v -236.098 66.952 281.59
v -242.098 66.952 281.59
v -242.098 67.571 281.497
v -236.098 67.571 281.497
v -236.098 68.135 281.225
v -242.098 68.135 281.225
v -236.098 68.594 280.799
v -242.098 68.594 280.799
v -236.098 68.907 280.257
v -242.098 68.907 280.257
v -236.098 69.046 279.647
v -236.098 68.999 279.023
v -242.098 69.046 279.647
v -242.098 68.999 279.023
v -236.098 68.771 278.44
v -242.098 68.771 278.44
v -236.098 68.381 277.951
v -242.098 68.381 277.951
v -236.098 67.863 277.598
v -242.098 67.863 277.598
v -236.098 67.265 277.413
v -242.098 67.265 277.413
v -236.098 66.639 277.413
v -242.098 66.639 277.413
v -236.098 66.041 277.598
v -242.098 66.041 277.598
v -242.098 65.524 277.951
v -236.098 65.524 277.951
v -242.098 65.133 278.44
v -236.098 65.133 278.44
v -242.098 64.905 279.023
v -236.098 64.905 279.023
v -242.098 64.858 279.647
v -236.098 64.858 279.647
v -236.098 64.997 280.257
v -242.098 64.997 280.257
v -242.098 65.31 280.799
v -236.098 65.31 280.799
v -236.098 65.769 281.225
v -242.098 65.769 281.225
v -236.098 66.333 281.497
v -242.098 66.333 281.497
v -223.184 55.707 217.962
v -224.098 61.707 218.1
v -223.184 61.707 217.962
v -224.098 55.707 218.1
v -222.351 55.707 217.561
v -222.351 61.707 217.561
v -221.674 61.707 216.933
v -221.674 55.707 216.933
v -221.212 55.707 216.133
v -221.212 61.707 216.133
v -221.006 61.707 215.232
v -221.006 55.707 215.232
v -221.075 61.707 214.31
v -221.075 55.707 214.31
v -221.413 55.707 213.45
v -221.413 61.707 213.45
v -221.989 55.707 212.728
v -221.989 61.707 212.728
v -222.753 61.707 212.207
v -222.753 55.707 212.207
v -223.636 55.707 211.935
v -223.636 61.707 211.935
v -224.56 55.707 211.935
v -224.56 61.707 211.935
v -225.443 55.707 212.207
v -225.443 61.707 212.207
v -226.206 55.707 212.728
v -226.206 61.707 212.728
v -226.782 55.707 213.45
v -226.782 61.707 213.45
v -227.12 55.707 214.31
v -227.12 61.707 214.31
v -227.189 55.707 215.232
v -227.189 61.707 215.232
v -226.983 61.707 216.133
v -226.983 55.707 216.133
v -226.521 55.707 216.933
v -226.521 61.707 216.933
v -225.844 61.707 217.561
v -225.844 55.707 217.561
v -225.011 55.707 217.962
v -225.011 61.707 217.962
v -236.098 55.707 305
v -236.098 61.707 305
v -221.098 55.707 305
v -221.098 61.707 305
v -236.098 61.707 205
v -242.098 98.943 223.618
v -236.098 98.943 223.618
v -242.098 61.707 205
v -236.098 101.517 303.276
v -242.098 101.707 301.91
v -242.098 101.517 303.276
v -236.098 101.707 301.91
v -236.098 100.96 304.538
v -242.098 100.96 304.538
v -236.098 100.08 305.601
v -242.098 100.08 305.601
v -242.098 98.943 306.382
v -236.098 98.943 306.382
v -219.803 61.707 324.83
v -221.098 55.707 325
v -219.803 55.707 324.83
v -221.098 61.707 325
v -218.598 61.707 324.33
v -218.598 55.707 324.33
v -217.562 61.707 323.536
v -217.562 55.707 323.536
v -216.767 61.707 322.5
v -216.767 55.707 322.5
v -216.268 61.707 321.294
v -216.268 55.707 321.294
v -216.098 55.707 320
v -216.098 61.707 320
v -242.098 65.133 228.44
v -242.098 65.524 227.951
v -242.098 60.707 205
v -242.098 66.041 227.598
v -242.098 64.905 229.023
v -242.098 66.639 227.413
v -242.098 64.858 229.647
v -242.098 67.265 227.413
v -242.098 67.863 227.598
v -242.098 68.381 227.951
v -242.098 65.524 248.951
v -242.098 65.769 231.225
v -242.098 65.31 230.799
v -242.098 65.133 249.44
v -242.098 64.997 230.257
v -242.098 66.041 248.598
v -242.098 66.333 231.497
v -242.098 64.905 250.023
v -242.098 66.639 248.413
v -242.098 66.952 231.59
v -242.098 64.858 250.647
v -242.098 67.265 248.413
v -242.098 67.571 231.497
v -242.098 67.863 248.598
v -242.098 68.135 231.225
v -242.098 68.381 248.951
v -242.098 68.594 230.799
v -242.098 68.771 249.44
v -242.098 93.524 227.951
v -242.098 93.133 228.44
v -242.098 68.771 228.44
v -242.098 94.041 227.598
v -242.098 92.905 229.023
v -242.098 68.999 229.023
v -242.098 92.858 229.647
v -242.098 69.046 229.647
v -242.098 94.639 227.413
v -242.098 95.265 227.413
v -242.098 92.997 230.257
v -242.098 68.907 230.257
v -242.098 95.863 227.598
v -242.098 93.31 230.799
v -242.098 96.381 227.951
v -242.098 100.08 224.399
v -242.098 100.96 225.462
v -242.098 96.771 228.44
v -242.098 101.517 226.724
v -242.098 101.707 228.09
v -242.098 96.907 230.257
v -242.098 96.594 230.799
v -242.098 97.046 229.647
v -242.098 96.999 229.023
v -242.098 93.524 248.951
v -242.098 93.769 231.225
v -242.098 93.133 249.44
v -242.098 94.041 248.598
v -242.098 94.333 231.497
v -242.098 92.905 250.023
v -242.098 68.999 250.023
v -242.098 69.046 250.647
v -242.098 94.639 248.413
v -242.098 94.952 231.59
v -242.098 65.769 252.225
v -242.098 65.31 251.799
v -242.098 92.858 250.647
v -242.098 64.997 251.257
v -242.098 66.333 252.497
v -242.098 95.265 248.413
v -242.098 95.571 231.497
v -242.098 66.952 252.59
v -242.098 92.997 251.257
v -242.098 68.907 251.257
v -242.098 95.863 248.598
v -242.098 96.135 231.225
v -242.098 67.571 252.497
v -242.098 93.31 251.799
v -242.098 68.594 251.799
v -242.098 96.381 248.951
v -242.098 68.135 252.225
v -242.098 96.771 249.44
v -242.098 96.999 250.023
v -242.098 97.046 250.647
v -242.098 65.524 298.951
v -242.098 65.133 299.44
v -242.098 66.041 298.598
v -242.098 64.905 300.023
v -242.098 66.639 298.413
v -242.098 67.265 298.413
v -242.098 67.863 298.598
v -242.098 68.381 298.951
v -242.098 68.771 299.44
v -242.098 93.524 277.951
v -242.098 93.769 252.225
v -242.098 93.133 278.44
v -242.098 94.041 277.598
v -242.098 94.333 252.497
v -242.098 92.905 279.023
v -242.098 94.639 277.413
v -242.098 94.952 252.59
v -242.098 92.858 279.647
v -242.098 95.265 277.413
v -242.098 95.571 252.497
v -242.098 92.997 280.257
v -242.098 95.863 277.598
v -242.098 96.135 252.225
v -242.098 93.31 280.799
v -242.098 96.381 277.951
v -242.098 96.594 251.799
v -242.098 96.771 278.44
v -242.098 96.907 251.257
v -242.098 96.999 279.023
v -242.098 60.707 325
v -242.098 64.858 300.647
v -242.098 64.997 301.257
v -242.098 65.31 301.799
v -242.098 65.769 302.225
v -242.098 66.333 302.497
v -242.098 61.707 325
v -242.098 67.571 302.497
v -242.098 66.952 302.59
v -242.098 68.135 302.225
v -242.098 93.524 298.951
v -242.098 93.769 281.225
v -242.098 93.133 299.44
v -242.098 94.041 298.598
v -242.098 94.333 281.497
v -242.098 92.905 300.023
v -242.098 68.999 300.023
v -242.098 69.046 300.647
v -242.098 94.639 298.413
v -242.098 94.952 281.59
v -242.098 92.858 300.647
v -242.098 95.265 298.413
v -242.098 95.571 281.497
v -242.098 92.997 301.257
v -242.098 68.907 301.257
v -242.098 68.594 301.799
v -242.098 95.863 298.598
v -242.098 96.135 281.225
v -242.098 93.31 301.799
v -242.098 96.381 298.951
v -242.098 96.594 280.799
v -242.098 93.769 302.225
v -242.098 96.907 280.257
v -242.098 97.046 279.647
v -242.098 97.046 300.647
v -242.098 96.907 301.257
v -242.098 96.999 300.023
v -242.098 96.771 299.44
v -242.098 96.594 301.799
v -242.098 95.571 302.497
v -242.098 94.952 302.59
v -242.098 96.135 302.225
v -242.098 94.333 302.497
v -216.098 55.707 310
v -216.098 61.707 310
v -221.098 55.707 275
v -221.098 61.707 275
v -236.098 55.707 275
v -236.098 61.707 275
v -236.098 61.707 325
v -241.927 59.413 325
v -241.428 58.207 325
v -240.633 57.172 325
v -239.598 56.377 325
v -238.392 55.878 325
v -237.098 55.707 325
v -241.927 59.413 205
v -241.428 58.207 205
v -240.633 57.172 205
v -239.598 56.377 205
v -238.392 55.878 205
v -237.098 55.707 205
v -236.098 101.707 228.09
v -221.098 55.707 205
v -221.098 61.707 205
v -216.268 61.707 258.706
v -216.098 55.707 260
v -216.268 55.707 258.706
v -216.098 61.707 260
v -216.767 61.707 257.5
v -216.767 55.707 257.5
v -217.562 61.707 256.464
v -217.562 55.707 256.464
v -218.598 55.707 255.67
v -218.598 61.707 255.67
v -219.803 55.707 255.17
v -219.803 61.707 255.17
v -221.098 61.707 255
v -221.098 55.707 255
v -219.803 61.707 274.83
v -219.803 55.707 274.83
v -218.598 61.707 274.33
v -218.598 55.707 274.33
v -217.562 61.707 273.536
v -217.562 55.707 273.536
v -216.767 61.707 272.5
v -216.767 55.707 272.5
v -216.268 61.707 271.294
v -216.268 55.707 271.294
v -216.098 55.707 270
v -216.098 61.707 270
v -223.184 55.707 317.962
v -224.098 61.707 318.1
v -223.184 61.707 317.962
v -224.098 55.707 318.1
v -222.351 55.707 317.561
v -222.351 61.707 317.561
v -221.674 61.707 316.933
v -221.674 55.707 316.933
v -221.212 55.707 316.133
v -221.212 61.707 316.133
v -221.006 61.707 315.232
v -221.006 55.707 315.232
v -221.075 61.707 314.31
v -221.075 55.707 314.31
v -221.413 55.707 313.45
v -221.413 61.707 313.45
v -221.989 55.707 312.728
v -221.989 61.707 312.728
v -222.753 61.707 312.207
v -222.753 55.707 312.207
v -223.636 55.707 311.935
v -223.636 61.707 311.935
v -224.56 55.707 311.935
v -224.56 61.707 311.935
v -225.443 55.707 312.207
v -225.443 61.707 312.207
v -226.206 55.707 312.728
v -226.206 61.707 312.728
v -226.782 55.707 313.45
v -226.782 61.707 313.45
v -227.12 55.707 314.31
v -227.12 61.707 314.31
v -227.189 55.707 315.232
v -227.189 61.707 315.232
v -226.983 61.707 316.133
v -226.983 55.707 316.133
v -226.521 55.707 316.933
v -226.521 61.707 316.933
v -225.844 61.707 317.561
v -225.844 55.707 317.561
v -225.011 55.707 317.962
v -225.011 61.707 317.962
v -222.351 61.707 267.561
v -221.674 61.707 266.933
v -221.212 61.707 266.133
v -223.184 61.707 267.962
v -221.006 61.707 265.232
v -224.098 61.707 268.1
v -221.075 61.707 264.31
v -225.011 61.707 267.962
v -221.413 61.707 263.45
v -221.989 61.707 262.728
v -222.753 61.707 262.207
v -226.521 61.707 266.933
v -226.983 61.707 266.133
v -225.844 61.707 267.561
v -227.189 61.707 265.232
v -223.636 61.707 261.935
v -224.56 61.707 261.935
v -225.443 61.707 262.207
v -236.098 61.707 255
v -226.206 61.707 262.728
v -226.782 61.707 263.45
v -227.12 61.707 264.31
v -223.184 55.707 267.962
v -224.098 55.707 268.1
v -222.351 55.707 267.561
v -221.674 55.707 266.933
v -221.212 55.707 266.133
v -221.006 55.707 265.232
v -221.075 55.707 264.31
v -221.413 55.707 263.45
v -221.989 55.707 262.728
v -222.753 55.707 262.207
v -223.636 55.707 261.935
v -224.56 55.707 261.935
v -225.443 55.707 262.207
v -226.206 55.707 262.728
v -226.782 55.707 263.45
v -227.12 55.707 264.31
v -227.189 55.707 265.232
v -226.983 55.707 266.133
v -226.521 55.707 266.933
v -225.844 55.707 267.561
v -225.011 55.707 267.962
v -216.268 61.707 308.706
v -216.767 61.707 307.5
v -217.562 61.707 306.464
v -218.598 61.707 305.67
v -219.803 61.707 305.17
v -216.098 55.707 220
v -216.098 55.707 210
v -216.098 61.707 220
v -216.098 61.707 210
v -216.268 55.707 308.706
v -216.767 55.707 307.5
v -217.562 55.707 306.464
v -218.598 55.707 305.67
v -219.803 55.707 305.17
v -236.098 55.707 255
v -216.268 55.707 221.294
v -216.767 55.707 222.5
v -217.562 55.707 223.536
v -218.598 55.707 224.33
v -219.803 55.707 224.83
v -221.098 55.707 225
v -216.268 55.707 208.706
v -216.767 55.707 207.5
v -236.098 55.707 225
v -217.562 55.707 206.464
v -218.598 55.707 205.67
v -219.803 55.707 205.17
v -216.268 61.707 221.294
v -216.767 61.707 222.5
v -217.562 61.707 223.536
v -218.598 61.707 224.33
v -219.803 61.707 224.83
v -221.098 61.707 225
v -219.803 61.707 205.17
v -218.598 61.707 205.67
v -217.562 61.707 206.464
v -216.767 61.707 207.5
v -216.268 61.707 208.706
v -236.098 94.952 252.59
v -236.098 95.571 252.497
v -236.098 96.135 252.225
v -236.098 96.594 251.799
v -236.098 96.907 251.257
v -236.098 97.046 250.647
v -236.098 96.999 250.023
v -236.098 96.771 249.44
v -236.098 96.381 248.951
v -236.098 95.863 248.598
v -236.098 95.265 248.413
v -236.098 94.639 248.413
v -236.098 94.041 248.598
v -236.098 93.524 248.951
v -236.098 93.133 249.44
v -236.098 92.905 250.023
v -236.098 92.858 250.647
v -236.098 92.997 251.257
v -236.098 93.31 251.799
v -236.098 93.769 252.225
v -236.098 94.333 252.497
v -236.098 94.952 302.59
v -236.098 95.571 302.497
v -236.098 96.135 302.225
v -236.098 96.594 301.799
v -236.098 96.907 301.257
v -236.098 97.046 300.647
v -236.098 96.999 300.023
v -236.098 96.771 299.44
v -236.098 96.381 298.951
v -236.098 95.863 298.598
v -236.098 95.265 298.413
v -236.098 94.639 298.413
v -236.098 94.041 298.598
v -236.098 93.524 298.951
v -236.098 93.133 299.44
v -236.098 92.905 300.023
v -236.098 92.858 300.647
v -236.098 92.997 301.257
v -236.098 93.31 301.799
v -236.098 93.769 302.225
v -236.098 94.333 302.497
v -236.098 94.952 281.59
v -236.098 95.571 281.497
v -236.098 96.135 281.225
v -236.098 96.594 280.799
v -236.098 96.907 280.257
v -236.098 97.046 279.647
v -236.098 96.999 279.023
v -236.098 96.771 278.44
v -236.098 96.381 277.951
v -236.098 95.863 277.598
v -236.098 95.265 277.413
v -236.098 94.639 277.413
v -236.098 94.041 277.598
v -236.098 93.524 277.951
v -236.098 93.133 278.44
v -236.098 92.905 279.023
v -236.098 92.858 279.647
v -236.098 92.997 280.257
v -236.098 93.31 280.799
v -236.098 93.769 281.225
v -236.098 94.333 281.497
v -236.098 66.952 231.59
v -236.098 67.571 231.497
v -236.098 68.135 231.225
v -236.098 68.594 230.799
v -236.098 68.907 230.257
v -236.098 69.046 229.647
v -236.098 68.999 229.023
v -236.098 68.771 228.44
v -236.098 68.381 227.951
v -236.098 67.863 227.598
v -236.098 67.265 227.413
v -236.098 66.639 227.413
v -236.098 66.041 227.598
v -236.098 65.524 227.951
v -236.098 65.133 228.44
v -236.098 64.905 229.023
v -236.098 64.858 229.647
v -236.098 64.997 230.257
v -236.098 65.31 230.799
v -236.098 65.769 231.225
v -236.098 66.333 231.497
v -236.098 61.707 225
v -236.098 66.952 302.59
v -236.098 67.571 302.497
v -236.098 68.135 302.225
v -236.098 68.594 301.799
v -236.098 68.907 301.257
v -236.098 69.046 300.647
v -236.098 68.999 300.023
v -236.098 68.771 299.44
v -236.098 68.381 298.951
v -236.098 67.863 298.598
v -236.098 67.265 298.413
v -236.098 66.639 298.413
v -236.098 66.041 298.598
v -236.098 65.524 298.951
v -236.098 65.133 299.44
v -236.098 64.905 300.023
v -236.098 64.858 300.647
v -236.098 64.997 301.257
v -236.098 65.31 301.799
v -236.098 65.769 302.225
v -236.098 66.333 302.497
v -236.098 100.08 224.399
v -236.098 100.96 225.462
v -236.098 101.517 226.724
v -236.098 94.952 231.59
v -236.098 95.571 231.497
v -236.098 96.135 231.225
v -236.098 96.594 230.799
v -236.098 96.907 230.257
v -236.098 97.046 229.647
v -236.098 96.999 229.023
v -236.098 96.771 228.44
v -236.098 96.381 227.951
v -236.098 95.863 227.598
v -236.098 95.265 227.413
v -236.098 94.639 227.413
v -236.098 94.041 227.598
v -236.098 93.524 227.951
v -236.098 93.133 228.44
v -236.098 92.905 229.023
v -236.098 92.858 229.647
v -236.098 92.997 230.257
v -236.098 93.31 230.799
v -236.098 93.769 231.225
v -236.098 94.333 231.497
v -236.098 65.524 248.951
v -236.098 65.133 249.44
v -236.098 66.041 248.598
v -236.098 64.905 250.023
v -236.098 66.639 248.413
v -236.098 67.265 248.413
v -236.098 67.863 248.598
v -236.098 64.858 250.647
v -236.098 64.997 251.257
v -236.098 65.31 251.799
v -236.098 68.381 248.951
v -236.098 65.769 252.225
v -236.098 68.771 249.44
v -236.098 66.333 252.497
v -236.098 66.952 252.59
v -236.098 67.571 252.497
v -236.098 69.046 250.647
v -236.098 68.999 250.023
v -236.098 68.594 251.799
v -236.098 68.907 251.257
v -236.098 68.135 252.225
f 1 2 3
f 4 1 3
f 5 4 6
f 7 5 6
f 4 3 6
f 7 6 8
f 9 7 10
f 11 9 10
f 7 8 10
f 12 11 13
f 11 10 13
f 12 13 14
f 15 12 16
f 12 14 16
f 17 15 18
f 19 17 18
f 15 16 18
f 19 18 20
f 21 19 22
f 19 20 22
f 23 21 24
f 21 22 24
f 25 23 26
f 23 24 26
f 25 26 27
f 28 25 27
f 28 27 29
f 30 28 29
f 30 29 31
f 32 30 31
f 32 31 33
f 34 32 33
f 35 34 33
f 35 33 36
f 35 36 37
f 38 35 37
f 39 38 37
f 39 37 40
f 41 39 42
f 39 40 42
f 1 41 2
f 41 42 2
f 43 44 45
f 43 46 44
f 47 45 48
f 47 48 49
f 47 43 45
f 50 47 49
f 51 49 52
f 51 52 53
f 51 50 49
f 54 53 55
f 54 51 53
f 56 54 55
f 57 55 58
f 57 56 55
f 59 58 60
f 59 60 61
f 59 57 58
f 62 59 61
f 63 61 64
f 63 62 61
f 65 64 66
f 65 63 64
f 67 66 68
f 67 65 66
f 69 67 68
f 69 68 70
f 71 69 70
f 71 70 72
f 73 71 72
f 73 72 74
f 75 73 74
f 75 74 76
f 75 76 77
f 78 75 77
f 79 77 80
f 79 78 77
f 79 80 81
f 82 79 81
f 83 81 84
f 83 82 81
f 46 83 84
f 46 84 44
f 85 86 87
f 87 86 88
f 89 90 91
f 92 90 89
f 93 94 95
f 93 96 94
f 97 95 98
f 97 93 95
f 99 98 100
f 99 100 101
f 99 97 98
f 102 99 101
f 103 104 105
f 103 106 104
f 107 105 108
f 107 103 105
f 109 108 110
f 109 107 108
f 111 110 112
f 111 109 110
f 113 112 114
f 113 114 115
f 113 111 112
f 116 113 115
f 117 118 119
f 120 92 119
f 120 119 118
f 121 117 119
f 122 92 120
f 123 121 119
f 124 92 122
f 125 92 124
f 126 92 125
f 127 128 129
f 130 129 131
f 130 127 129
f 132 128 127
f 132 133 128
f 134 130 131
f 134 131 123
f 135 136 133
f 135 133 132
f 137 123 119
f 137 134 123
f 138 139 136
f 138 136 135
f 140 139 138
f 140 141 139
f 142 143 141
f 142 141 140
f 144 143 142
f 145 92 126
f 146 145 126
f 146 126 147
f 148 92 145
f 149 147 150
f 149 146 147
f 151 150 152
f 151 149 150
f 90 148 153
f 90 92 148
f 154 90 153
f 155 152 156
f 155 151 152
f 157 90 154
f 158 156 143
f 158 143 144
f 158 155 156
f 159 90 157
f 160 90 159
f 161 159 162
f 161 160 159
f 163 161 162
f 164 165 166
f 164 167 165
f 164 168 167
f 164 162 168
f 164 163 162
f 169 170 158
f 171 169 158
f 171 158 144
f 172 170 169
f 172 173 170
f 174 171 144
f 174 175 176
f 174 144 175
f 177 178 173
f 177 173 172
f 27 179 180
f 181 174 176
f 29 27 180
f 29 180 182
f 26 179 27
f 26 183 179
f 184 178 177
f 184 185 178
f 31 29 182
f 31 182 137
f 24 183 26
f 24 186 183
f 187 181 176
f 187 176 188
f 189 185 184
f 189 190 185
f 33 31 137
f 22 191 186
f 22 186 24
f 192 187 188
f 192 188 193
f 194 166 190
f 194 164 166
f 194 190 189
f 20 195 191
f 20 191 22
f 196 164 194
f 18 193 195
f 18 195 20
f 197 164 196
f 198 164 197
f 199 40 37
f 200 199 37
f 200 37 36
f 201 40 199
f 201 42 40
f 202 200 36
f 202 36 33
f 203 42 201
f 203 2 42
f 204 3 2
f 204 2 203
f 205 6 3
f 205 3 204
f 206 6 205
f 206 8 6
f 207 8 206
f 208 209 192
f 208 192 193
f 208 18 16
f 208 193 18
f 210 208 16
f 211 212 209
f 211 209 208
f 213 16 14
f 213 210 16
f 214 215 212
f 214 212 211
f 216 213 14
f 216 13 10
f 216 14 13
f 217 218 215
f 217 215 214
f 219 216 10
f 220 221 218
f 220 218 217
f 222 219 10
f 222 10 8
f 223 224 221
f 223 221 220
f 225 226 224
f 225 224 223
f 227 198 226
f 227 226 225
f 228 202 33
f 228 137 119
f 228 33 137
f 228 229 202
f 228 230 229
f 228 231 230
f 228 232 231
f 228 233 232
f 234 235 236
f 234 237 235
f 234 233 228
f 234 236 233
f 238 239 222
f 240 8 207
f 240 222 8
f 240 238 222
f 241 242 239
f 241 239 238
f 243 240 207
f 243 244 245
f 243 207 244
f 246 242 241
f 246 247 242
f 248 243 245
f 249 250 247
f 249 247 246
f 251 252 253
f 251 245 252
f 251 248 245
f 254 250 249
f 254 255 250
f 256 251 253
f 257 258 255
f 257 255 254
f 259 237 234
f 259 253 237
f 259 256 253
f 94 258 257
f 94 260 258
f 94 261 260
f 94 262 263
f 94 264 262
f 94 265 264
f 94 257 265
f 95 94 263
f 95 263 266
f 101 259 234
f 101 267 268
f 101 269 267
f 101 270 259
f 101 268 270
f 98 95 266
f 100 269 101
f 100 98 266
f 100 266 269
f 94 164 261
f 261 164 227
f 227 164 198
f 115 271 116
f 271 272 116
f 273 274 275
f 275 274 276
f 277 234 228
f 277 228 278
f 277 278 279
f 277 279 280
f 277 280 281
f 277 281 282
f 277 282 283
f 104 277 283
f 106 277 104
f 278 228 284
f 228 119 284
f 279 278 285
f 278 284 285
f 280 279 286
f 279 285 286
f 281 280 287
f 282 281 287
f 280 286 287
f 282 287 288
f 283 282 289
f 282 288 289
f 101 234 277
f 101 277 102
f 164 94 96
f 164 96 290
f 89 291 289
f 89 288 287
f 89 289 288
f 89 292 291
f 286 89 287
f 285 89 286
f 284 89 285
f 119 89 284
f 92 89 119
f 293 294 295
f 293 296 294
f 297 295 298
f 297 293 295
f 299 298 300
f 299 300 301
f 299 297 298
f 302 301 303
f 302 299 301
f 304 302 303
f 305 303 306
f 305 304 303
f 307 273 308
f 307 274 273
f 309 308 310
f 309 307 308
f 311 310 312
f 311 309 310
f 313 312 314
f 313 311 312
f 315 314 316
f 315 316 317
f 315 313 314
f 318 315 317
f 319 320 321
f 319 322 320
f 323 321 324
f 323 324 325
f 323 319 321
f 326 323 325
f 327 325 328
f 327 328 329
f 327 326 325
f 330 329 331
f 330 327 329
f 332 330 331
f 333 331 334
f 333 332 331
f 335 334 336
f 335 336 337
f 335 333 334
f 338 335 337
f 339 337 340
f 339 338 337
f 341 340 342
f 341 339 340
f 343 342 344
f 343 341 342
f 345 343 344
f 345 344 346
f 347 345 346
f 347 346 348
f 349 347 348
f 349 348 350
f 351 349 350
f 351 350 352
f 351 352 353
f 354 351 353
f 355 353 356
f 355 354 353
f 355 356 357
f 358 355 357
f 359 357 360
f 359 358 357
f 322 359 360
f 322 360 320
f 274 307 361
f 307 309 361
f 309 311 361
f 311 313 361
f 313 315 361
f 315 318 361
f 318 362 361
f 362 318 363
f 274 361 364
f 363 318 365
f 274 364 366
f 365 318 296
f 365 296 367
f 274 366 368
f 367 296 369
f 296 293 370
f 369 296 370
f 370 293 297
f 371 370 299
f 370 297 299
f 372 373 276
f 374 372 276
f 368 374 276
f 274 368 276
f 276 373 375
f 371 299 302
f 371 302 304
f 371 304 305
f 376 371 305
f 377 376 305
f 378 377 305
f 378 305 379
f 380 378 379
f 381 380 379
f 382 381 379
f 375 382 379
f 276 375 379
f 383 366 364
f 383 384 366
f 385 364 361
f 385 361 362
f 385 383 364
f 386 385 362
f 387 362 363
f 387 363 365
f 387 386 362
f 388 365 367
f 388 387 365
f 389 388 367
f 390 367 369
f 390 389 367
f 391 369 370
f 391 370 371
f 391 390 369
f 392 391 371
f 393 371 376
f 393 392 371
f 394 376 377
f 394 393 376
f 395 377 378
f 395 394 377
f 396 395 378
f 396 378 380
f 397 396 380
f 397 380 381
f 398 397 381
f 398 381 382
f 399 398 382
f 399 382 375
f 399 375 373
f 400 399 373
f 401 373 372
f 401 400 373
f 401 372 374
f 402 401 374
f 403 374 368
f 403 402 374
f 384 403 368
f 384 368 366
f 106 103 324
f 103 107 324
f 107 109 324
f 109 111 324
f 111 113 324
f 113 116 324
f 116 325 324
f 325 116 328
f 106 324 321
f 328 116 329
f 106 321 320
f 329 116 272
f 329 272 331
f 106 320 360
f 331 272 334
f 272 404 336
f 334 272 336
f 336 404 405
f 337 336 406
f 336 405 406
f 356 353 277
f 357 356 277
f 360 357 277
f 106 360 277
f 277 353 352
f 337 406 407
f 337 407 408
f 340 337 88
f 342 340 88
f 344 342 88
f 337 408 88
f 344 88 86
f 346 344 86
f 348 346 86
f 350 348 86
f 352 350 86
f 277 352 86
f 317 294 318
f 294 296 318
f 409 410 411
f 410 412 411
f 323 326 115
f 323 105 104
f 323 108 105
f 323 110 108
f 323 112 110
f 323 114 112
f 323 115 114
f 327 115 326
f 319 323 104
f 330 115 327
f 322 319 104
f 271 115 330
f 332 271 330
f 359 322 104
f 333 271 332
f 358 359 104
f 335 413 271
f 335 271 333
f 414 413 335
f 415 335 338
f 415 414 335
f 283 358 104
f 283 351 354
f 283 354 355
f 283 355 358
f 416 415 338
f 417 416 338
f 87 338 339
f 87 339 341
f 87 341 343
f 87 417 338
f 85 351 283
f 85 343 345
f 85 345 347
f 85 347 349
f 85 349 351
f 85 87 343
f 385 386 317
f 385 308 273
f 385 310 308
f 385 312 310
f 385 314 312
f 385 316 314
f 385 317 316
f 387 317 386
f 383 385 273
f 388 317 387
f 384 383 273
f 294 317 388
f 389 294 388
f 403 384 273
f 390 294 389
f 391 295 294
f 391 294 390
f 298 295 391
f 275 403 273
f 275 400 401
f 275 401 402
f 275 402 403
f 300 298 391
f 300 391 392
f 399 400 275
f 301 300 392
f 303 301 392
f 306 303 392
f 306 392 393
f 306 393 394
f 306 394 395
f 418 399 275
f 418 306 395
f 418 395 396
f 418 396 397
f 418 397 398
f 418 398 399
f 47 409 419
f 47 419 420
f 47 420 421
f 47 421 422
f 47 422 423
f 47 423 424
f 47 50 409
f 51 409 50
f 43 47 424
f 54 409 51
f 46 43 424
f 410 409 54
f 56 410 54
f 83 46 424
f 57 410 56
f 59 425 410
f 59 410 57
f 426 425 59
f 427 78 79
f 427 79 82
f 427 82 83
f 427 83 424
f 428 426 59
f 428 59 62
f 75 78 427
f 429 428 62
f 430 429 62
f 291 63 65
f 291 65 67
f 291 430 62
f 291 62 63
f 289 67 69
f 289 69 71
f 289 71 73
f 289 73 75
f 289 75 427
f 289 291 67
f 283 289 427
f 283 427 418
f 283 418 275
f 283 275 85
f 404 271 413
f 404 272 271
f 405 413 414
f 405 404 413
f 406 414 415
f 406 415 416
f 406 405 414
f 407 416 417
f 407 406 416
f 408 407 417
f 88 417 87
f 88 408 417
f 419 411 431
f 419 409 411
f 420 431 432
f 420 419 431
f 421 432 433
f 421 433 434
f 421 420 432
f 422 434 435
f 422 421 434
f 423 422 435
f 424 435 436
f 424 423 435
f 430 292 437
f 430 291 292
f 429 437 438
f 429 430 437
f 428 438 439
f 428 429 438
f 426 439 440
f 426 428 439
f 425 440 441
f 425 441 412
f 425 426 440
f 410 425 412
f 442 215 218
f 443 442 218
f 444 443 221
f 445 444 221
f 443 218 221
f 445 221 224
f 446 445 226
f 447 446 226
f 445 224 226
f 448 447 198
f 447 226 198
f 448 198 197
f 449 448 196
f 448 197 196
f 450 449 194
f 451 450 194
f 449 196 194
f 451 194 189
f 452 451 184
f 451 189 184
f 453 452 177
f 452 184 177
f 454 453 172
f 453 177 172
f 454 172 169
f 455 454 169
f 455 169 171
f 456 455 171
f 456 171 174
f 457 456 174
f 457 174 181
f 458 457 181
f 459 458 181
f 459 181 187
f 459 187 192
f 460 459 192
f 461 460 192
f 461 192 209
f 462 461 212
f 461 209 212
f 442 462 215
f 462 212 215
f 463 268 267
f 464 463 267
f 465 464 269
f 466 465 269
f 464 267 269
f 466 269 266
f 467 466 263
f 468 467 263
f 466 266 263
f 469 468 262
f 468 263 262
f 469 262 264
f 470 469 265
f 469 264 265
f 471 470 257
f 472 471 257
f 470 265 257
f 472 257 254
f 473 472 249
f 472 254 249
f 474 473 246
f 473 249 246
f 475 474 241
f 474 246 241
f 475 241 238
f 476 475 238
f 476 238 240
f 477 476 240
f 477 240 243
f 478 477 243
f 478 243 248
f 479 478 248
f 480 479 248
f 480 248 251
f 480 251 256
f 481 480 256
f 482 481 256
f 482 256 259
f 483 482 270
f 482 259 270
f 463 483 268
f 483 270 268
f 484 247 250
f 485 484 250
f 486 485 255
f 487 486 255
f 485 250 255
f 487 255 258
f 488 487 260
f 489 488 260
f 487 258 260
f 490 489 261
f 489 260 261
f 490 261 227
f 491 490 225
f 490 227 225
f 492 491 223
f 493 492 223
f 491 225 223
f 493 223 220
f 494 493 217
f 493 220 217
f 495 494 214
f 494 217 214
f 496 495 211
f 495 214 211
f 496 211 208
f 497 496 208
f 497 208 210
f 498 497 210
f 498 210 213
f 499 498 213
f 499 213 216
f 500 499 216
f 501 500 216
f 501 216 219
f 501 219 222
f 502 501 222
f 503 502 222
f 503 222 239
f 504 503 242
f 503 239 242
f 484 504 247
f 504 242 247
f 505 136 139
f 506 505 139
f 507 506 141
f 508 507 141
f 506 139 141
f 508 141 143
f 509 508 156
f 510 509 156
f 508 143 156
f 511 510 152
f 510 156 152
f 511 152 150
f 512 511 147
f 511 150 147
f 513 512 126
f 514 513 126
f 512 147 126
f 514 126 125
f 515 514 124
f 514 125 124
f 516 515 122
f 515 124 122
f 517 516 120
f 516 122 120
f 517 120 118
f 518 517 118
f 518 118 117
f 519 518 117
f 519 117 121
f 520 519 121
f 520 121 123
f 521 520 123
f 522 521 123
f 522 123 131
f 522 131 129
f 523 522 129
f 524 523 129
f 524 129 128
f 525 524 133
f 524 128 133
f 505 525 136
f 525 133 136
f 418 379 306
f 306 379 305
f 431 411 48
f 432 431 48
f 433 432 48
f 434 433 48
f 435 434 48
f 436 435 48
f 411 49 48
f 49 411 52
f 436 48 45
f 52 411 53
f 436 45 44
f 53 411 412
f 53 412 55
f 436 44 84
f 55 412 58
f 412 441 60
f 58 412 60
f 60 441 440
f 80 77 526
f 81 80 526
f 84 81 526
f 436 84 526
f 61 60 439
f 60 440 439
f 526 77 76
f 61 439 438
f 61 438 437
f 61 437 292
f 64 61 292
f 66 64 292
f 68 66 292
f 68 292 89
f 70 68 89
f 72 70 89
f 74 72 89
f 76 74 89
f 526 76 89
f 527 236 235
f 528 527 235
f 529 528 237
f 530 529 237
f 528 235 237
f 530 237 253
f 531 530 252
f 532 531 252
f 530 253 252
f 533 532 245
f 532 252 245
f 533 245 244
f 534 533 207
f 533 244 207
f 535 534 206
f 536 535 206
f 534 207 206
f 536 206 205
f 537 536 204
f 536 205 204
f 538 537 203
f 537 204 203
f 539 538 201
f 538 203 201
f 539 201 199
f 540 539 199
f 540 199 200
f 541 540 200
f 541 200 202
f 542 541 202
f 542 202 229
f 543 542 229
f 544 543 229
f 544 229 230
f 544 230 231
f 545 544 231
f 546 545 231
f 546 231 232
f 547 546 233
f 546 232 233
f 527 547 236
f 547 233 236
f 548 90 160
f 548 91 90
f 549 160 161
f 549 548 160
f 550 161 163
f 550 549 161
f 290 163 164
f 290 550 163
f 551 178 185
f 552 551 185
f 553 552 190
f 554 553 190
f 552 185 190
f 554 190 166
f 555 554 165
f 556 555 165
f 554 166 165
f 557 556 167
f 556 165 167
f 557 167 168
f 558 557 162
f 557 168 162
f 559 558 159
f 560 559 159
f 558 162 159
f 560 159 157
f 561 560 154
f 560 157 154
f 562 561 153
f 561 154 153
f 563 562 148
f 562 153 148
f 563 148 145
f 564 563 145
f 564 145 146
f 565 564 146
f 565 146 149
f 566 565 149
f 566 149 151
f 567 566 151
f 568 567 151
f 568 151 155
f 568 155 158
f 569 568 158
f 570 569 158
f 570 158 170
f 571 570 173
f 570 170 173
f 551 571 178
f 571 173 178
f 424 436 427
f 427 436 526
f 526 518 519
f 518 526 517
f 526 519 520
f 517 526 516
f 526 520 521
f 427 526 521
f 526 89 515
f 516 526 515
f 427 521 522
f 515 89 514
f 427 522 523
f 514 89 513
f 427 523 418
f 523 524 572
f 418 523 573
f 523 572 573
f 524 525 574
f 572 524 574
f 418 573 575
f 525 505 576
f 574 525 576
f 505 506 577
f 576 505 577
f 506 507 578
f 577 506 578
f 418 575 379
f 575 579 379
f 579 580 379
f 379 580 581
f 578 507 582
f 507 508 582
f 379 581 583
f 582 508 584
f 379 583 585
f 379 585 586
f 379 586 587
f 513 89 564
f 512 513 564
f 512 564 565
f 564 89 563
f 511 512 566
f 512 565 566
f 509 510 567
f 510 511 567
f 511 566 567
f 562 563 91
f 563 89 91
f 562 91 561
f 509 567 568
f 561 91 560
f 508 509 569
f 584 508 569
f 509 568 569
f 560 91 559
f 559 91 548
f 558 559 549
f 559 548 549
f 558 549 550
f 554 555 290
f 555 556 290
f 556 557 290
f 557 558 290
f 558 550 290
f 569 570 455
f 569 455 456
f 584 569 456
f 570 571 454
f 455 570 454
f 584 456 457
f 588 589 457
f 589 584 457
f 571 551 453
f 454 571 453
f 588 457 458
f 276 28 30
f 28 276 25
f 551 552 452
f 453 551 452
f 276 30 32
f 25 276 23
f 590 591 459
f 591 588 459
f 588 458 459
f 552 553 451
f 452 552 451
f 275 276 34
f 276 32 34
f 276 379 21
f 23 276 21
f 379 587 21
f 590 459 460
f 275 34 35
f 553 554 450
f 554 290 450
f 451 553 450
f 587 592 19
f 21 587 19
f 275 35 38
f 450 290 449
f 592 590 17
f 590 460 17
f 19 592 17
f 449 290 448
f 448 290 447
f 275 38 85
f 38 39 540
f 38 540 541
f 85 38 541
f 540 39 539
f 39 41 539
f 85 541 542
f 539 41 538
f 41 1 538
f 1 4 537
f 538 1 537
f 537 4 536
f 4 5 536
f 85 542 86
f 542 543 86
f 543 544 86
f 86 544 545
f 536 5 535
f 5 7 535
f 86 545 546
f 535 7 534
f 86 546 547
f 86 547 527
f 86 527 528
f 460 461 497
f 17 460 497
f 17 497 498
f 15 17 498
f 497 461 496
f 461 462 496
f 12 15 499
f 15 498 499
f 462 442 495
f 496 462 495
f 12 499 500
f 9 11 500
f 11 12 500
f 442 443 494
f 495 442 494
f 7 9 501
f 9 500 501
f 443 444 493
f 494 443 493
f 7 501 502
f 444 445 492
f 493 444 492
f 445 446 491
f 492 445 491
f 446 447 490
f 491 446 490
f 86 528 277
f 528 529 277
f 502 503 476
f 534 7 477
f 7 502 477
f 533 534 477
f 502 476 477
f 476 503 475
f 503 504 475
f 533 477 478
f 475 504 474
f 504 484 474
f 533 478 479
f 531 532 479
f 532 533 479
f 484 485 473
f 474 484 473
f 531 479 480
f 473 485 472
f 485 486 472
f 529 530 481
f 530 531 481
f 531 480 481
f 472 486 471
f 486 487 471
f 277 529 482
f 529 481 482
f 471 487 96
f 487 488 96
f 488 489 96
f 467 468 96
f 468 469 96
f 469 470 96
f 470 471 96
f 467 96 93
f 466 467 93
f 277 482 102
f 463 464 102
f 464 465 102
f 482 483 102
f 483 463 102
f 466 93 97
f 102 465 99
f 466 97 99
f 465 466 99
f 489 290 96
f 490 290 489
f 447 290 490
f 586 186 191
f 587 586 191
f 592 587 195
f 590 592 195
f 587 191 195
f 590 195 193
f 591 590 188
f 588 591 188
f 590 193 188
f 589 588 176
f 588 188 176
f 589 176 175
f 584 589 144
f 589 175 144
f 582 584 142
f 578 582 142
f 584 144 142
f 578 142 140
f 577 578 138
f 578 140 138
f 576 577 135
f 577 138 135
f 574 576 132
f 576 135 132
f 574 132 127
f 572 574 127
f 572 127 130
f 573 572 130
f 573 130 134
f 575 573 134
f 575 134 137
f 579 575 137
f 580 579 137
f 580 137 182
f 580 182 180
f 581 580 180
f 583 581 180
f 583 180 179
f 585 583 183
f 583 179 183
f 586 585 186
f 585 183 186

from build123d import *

# Parameters (mm, degrees)
CROQUIS2_R              = 3.1
SALIENTE_EXTRUIR1_DEPTH = 3
CROQUIS4_R              = 2.1
SALIENTE_EXTRUIR2_DEPTH = 6
REDONDEO1_R             = 5


with BuildPart() as part:
    # Croquis2 → Saliente-Extruir1 (new, symmetric)
    with BuildSketch(Plane(origin=(0, 58.707138557, 0), x_dir=(1, 0, 0), z_dir=(0, 1, 0))):
        Polygon((-236.097571291, -325), (-242.097571291, -325), (-242.097571291, -205), (-236.097571291, -205), (-216.097571291, -205), (-216.097571291, -225), (-236.097571291, -225), (-236.097571291, -255), (-216.097571291, -255), (-216.097571291, -275), (-236.097571291, -275), (-236.097571291, -305), (-216.097571291, -305), (-216.097571291, -325), align=None)
        with Locations(Location((-224.097571291, -215, 0), (0, 0, 270))):
            Circle(CROQUIS2_R, mode=Mode.SUBTRACT)
        with Locations(Location((-224.097571291, -265, 0), (0, 0, 270))):
            Circle(CROQUIS2_R, mode=Mode.SUBTRACT)
        with Locations(Location((-224.097571291, -315, 0), (0, 0, 270))):
            Circle(CROQUIS2_R, mode=Mode.SUBTRACT)
    extrude(amount=SALIENTE_EXTRUIR1_DEPTH, both=True)

    # Croquis4 → Saliente-Extruir2 (add)
    with BuildSketch(Plane.ZY.offset(242.097571291)):
        Polygon((205, 61.707138557), (325, 61.707138557), (305, 101.707138557), (225, 101.707138557), align=None)
        with Locations((250.49, 66.952138557)):
            Circle(CROQUIS4_R, mode=Mode.SUBTRACT)
        with Locations((229.49, 66.952138557)):
            Circle(CROQUIS4_R, mode=Mode.SUBTRACT)
        with Locations((279.49, 66.952138557)):
            Circle(CROQUIS4_R, mode=Mode.SUBTRACT)
        with Locations((300.49, 66.952138557)):
            Circle(CROQUIS4_R, mode=Mode.SUBTRACT)
        with Locations((279.49, 94.952138557)):
            Circle(CROQUIS4_R, mode=Mode.SUBTRACT)
        with Locations((300.49, 94.952138557)):
            Circle(CROQUIS4_R, mode=Mode.SUBTRACT)
        with Locations((229.49, 94.952138557)):
            Circle(CROQUIS4_R, mode=Mode.SUBTRACT)
        with Locations((250.49, 94.952138557)):
            Circle(CROQUIS4_R, mode=Mode.SUBTRACT)
    extrude(amount=-SALIENTE_EXTRUIR2_DEPTH)

    # Redondeo1
    redondeo1_edges = [part.edges().sort_by_distance(p)[0] for p in [
        (-242.097571291, 55.707138557, 265),
        (-216.097571291, 58.707138557, 205),
        (-216.097571291, 58.707138557, 225),
        (-216.097571291, 58.707138557, 255),
        (-216.097571291, 58.707138557, 275),
        (-216.097571291, 58.707138557, 305),
        (-216.097571291, 58.707138557, 325),
        (-239.097571291, 101.707138557, 305),
        (-239.097571291, 101.707138557, 225),
    ]]
    fillet(redondeo1_edges, radius=REDONDEO1_R)


solid = part.part
